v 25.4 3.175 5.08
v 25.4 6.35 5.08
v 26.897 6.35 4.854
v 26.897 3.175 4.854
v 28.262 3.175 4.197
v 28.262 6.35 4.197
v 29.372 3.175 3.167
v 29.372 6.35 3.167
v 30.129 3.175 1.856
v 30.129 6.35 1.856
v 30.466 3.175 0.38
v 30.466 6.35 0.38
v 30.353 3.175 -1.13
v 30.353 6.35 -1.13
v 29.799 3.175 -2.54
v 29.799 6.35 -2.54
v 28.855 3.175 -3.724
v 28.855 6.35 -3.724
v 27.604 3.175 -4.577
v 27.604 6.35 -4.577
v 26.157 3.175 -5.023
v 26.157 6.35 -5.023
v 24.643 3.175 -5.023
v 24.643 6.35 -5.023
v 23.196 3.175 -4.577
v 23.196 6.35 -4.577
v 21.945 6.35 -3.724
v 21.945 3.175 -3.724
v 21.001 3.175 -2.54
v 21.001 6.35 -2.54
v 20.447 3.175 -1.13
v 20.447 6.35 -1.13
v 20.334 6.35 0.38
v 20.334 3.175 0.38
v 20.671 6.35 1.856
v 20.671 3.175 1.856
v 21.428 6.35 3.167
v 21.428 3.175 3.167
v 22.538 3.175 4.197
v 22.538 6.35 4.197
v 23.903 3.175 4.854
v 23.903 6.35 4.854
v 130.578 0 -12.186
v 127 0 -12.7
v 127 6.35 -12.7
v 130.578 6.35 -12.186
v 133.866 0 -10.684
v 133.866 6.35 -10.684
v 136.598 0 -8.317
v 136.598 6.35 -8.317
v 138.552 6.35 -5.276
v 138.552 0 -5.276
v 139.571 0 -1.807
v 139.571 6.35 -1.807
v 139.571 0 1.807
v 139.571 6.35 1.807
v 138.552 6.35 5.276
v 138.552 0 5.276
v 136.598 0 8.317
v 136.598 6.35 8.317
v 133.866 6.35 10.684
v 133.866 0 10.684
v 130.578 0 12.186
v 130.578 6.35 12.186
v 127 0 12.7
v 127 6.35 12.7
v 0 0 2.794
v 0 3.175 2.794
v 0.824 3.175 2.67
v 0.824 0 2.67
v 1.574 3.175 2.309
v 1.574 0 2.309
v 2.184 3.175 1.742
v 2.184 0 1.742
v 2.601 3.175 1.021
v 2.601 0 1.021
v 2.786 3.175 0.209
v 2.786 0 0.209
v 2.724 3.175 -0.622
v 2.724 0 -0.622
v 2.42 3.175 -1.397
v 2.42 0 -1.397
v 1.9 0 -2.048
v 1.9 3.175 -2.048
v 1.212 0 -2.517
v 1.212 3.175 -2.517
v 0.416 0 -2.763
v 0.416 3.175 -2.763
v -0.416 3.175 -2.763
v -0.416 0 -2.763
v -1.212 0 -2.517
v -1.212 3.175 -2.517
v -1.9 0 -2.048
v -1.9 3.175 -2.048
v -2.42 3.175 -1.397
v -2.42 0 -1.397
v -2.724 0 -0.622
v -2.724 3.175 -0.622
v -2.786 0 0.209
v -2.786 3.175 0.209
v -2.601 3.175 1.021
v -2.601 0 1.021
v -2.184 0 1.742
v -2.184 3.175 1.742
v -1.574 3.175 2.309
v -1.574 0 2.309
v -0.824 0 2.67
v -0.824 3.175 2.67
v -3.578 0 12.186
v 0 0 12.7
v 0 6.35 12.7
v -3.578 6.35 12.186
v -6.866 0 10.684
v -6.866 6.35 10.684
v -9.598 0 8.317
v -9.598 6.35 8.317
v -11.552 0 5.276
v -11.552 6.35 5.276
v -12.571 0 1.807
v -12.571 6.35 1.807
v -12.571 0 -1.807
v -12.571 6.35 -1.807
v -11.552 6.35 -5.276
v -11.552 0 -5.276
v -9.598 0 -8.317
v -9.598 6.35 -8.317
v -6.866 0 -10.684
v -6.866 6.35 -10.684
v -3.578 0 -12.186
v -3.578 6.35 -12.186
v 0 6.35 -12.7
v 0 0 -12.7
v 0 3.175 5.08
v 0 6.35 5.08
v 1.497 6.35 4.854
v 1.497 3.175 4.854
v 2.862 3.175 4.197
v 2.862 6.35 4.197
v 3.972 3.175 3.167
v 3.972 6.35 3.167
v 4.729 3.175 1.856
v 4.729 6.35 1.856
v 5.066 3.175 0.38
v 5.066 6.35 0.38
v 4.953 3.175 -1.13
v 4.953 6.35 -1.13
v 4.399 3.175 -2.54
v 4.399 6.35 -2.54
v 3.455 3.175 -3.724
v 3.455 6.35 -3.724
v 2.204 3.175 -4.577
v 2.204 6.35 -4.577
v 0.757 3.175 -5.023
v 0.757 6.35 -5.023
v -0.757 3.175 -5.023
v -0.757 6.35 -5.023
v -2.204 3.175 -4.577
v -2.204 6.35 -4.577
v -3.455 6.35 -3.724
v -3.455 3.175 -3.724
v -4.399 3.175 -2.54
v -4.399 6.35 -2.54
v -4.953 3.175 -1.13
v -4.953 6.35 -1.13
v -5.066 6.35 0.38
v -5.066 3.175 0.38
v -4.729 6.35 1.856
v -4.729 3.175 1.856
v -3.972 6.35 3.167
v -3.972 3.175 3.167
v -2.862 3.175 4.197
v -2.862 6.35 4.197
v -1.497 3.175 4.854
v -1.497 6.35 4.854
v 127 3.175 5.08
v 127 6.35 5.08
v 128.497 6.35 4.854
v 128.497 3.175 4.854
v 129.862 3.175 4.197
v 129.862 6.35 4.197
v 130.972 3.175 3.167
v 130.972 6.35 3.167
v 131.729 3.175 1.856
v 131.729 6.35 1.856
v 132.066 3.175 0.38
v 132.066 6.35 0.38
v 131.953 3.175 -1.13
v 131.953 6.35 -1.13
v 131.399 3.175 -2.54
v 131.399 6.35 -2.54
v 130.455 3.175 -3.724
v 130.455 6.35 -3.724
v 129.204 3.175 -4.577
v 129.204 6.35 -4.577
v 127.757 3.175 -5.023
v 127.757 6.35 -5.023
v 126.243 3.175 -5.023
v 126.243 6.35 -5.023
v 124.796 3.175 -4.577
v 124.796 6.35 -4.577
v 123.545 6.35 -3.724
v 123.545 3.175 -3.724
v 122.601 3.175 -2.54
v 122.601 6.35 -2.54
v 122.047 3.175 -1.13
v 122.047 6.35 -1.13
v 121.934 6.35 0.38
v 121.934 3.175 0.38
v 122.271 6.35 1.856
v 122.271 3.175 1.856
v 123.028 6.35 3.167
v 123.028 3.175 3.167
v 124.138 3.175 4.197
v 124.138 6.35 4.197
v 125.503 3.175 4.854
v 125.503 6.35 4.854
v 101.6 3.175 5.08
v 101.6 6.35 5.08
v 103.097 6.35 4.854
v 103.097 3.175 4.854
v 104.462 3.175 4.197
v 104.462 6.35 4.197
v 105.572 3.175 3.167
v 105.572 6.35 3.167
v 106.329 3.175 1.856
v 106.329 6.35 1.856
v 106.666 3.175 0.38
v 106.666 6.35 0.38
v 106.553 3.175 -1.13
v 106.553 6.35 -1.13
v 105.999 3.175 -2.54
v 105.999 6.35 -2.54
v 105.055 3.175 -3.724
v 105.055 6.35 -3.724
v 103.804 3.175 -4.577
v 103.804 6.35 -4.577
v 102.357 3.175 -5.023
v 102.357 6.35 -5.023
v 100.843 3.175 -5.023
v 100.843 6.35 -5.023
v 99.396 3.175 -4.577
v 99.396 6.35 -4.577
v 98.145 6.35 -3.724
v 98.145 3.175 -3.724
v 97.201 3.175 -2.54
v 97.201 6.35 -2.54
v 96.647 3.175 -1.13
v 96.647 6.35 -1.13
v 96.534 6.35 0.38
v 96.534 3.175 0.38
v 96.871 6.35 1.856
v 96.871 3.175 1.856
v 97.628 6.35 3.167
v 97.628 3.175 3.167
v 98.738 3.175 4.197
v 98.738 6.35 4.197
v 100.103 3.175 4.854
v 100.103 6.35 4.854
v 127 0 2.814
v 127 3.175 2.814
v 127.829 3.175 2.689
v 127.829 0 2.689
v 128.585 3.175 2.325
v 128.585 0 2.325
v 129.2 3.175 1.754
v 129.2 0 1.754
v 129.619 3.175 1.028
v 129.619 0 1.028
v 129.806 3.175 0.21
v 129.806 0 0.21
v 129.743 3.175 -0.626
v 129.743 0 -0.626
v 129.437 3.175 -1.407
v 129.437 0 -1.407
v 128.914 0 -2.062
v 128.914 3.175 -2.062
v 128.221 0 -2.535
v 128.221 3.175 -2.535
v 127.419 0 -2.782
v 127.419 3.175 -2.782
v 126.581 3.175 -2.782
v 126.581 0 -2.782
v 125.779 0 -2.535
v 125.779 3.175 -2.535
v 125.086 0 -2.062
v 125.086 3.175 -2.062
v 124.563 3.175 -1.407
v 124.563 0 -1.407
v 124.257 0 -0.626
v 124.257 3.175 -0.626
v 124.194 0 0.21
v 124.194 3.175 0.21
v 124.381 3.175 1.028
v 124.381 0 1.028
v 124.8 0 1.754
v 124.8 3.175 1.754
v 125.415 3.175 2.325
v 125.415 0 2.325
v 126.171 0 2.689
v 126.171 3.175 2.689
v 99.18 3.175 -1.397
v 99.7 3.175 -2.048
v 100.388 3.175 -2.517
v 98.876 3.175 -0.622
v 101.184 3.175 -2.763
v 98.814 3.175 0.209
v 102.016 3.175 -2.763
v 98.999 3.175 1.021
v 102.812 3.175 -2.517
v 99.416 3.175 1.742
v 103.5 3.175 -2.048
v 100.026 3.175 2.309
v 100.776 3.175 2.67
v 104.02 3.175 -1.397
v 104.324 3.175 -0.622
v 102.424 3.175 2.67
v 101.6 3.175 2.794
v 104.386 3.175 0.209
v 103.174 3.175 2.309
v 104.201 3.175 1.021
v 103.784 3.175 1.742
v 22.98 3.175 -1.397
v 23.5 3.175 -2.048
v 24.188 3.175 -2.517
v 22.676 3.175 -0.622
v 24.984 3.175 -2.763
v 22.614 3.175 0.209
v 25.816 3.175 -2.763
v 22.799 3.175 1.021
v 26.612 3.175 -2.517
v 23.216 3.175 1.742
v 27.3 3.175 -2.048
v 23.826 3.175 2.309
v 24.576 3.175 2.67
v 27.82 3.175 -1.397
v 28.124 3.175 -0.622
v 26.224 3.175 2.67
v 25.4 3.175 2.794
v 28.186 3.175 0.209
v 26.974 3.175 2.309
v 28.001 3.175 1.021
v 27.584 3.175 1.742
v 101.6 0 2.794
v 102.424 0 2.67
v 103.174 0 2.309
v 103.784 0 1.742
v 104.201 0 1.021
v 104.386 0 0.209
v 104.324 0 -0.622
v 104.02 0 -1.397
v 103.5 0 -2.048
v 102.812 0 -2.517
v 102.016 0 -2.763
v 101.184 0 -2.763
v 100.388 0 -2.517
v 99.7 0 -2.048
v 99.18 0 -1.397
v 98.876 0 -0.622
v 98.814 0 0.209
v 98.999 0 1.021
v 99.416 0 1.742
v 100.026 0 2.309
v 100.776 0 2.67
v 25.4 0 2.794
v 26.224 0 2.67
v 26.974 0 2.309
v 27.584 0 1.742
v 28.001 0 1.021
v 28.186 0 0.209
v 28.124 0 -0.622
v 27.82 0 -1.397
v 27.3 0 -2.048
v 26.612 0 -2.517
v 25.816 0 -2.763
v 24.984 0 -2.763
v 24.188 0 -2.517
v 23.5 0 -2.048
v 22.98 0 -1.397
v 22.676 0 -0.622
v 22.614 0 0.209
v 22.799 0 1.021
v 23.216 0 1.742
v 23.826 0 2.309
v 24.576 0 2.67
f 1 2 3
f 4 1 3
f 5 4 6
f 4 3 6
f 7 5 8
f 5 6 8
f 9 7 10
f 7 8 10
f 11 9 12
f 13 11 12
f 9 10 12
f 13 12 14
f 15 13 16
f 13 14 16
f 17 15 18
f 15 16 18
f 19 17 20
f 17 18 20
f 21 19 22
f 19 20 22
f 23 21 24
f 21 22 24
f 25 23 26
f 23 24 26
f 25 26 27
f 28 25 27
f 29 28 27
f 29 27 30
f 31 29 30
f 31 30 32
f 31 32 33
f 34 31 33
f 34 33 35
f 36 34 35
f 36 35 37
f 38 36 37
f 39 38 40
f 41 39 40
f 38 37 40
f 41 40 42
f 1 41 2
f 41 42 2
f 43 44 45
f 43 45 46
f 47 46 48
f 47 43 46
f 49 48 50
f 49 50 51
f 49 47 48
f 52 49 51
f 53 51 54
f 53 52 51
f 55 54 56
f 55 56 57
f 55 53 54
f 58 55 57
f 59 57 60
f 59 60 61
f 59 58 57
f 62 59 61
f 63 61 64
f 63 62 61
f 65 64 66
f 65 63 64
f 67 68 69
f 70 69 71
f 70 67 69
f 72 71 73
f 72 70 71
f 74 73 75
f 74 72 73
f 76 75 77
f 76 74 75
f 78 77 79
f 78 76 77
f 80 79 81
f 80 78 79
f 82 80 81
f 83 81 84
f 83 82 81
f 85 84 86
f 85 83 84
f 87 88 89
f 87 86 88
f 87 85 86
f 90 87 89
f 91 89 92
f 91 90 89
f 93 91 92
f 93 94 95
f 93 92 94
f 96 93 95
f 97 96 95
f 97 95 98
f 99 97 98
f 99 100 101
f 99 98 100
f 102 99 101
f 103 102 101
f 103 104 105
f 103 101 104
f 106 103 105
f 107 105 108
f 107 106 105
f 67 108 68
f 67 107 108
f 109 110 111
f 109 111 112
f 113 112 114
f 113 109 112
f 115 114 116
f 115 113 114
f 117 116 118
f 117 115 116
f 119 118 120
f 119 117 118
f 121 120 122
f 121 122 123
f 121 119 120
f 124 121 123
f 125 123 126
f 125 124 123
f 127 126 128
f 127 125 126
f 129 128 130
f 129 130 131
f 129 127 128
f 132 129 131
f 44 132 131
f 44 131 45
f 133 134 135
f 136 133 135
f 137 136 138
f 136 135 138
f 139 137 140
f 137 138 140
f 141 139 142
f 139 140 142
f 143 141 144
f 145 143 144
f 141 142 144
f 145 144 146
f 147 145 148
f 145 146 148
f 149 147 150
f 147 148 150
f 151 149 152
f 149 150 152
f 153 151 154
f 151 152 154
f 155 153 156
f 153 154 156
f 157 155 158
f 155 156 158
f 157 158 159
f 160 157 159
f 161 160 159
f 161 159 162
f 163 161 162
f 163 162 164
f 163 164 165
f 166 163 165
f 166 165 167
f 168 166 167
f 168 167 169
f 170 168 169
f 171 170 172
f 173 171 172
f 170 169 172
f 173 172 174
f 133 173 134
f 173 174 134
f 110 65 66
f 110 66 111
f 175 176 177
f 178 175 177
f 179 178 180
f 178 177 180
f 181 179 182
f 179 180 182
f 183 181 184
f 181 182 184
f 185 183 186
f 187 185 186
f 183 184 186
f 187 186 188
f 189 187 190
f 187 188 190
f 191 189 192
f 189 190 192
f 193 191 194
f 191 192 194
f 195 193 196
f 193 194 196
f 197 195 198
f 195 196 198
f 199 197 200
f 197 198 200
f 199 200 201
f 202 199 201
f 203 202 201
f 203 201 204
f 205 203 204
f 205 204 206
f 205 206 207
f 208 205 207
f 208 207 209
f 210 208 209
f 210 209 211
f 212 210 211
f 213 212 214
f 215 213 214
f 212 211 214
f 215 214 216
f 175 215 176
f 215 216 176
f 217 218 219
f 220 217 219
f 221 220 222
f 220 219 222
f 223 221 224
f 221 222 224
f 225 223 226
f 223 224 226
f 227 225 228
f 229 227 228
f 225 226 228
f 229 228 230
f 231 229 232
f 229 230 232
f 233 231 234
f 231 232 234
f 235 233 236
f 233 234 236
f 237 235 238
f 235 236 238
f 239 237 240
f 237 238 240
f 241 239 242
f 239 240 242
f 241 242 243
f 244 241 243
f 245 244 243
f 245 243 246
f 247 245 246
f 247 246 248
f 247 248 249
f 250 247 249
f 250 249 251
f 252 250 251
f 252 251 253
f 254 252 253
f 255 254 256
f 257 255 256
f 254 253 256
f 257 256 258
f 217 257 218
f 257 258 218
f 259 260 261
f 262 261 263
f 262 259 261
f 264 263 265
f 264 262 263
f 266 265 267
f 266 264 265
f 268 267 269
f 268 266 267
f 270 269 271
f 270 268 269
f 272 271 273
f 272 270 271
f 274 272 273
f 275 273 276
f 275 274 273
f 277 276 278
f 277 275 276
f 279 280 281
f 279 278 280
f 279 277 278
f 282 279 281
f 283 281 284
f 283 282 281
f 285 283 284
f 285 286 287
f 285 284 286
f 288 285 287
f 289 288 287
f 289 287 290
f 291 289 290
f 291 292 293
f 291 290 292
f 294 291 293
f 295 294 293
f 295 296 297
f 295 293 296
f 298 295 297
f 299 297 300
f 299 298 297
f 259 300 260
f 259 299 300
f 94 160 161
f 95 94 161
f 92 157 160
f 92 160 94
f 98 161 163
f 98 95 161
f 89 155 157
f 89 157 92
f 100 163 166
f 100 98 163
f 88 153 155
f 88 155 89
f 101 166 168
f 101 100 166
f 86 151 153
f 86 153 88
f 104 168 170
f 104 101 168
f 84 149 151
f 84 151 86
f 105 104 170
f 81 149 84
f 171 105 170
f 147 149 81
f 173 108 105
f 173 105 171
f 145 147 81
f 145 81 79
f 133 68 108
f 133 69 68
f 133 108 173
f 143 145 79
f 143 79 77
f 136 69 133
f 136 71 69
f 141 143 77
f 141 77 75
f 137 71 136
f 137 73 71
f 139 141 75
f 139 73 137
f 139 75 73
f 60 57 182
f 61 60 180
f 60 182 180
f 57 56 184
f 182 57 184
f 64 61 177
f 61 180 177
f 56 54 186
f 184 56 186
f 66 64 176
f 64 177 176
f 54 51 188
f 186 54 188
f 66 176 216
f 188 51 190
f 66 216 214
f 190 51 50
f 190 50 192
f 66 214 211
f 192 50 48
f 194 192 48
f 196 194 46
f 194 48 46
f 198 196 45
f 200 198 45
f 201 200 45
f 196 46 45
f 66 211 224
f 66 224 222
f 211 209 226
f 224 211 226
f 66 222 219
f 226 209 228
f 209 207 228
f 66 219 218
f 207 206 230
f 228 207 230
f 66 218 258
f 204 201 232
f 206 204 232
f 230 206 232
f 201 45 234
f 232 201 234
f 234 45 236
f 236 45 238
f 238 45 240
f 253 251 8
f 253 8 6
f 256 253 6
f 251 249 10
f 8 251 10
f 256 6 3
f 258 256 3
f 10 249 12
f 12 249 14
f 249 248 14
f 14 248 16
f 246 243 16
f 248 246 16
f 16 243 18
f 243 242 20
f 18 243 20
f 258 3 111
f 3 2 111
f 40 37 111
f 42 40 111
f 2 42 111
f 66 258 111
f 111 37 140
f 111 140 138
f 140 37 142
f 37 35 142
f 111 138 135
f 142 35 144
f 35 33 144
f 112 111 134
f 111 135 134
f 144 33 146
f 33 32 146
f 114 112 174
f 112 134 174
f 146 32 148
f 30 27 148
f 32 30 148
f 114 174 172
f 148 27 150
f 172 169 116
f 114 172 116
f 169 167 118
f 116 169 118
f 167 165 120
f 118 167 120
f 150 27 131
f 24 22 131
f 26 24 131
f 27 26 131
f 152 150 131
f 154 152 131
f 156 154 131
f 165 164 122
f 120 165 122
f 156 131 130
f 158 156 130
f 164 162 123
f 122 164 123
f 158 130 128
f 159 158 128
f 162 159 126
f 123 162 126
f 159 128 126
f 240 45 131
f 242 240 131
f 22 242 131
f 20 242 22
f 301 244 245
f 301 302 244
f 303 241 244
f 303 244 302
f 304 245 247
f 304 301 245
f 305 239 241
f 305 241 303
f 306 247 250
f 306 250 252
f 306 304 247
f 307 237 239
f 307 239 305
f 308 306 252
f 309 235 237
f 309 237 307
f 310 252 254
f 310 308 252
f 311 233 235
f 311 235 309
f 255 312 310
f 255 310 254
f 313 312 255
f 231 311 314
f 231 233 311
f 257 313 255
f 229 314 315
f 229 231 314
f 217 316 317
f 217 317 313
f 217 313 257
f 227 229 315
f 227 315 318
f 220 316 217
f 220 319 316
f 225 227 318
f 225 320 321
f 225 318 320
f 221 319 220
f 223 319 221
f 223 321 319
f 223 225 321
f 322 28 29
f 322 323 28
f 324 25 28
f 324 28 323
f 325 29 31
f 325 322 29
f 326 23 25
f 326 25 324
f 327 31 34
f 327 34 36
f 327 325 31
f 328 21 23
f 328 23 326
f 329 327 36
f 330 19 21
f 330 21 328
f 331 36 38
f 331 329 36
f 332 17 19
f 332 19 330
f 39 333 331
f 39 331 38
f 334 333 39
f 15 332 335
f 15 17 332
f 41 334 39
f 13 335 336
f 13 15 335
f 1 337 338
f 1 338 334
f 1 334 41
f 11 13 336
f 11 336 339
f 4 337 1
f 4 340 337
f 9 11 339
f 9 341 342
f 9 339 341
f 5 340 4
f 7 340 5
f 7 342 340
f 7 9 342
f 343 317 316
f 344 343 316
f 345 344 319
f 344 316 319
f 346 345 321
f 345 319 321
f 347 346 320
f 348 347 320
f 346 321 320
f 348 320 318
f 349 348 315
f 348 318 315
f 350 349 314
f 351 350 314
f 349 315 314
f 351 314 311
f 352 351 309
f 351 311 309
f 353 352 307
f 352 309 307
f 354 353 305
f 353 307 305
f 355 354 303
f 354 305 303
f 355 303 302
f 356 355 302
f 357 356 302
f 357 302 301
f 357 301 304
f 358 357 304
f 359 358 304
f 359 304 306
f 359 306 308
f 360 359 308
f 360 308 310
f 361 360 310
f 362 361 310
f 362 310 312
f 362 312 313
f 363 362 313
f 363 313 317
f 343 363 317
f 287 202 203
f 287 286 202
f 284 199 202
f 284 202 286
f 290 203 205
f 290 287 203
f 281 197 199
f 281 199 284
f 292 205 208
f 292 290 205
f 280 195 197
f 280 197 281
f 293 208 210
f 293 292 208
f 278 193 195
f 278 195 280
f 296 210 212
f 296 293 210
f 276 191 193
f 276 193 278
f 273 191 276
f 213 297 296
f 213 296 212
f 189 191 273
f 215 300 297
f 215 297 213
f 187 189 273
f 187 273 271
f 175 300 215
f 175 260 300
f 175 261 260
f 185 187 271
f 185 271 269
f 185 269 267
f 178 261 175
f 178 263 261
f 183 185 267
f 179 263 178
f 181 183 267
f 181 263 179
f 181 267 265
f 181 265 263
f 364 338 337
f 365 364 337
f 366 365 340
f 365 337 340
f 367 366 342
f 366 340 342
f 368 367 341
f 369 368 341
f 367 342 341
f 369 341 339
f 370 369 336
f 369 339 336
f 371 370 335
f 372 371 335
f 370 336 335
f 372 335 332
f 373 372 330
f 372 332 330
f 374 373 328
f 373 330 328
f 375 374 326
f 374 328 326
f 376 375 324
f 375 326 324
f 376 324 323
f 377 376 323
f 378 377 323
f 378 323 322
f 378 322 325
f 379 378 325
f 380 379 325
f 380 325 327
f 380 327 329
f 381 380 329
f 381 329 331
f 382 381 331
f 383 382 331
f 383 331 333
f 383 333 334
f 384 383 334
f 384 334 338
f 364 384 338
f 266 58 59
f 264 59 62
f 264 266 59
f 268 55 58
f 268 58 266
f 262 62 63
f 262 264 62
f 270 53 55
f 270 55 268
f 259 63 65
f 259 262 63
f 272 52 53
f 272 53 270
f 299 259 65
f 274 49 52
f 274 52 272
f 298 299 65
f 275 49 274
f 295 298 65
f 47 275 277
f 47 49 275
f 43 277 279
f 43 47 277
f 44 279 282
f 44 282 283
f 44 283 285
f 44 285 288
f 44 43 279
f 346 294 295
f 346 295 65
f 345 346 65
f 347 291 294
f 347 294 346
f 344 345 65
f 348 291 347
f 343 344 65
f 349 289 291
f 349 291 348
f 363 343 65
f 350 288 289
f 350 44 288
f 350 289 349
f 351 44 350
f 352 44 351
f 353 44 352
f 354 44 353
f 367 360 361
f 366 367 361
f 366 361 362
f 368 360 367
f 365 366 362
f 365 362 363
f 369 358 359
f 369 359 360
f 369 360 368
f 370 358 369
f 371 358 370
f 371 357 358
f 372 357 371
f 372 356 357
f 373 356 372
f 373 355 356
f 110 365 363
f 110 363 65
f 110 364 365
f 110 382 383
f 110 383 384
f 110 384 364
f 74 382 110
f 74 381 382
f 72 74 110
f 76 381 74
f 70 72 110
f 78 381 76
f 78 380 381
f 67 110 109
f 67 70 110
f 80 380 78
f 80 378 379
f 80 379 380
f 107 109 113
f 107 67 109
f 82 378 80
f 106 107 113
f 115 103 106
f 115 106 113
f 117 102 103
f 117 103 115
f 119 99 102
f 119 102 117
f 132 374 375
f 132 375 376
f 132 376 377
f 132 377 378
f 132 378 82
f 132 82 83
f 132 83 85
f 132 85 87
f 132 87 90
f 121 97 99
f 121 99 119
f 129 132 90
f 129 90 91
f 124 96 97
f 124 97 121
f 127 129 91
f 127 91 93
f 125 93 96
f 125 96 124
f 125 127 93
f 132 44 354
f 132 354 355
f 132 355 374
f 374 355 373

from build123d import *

# Parameters (mm, degrees)
SKETCH1_R           = 2.794
SKETCH1_R_2         = 2.813515076
BOSS_EXTRUDE1_DEPTH = 6.35
SKETCH3_R           = 2.794
CUT_EXTRUDE2_DEPTH  = 6.35
SKETCH2_R           = 5.08
CUT_EXTRUDE1_DEPTH  = 3.175


with BuildPart() as part:
    # Sketch1 → Boss-Extrude1 (new body)
    with BuildSketch(Plane(origin=(0, 0, 0), x_dir=(1, 0, 0), z_dir=(0, 1, 0))):
        with BuildLine():
            Line((0, 12.7), (127, 12.7))
            ThreePointArc((127, 12.7), (139.7, 0), (127, -12.7))
            Line((127, -12.7), (0, -12.7))
            ThreePointArc((0, -12.7), (-12.7, 0), (0, 12.7))
        make_face()
        with Locations(Location((0, 0, 0), (0, 0, 270))):
            Circle(SKETCH1_R, mode=Mode.SUBTRACT)
        with Locations(Location((127, 0, 0), (0, 0, 270))):
            Circle(SKETCH1_R_2, mode=Mode.SUBTRACT)
    extrude(amount=BOSS_EXTRUDE1_DEPTH)

    # Sketch3 → Cut-Extrude2 (cut)
    with BuildSketch(Plane(origin=(0, 6.35, 0), x_dir=(1, 0, 0), z_dir=(0, 1, 0))):
        with Locations(Location((25.4, 0, 0), (0, 0, 270))):
            Circle(SKETCH3_R)
        with Locations(Location((101.6, 0, 0), (0, 0, 270))):
            Circle(SKETCH3_R)
    extrude(amount=-CUT_EXTRUDE2_DEPTH, mode=Mode.SUBTRACT)

    # Sketch2 → Cut-Extrude1 (cut)
    with BuildSketch(Plane(origin=(0, 6.35, 0), x_dir=(1, 0, 0), z_dir=(0, 1, 0))):
        with Locations(Location((0, 0, 0), (0, 0, 270))):
            Circle(SKETCH2_R)
        with Locations(Location((127, 0, 0), (0, 0, 270))):
            Circle(SKETCH2_R)
        with Locations(Location((25.4, 0, 0), (0, 0, 270))):
            Circle(SKETCH2_R)
        with Locations(Location((101.6, 0, 0), (0, 0, 270))):
            Circle(SKETCH2_R)
    extrude(amount=-CUT_EXTRUDE1_DEPTH, mode=Mode.SUBTRACT)


solid = part.part
